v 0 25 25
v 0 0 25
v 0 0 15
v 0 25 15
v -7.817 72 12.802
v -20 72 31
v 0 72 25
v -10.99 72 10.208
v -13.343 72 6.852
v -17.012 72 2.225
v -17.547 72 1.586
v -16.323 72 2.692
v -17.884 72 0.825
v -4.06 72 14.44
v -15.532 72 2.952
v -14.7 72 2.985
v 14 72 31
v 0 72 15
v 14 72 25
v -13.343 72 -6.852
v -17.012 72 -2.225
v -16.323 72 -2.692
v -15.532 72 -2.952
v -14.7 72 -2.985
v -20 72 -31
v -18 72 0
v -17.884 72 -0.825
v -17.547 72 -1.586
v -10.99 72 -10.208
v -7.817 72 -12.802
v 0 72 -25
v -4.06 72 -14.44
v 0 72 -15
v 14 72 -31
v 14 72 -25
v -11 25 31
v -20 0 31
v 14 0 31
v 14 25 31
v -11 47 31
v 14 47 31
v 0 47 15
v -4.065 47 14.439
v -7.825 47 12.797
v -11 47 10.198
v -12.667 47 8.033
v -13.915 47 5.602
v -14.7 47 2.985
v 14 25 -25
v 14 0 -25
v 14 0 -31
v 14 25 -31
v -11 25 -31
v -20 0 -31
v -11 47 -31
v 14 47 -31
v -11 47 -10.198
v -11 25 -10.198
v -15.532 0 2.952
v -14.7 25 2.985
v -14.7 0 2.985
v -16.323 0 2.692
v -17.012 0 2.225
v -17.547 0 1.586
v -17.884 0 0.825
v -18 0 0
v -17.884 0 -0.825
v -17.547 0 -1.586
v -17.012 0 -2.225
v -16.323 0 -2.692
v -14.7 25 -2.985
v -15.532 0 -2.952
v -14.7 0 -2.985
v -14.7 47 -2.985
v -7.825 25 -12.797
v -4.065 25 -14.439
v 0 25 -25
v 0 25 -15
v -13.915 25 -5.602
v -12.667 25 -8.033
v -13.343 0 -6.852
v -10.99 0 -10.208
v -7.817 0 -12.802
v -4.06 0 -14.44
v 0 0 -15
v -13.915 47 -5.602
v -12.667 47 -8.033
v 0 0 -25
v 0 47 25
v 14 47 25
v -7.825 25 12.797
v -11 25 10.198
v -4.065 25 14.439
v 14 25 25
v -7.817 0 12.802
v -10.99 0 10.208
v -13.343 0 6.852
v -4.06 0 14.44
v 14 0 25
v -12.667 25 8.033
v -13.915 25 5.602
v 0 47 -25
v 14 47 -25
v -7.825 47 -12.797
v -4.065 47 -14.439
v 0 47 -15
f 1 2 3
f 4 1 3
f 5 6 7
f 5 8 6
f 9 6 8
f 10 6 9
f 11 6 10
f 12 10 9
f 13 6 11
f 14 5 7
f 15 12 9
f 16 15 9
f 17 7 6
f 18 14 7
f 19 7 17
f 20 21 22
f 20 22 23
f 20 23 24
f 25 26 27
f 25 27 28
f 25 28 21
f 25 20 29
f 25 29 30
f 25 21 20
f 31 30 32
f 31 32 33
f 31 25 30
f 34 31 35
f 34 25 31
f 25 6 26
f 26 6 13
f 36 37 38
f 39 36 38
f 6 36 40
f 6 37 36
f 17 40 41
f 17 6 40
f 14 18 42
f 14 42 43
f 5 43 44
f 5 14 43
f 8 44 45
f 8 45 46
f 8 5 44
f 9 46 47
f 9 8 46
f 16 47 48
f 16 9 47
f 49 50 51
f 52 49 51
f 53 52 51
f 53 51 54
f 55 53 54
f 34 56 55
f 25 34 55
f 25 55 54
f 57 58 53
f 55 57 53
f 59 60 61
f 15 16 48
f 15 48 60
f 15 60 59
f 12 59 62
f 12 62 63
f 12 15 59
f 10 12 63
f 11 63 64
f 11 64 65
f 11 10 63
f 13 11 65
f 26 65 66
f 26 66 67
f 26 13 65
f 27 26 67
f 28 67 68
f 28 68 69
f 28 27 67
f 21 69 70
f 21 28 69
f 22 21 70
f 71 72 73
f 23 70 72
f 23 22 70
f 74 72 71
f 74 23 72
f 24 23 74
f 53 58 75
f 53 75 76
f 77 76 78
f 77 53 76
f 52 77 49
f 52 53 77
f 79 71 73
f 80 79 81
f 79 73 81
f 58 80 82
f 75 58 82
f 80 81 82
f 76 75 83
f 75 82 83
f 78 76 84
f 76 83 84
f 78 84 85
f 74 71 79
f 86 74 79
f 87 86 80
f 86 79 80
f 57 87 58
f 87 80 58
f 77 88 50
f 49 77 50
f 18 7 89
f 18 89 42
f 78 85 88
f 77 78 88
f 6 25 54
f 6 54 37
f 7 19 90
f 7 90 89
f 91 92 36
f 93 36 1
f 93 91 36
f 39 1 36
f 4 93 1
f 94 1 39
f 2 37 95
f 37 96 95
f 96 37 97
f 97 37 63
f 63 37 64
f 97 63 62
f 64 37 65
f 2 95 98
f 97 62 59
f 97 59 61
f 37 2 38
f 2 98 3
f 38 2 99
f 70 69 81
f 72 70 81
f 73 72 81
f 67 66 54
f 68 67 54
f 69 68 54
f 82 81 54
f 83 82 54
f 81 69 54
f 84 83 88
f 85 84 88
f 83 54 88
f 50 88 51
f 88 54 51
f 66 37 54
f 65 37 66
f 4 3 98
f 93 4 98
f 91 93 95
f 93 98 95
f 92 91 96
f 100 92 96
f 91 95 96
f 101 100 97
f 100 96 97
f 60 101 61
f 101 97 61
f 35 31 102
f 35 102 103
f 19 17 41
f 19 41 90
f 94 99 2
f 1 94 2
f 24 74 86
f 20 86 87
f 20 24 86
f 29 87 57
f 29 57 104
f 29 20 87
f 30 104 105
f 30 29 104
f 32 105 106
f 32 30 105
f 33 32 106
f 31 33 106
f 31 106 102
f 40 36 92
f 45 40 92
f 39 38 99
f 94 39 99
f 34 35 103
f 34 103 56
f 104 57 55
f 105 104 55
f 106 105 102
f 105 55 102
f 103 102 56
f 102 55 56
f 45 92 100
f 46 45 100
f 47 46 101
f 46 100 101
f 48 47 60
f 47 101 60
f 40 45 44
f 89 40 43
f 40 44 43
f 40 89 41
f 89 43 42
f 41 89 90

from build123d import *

# Parameters (mm, degrees)
BOSS_EXTRUDE1_DEPTH = 25
BOSS_EXTRUDE2_DEPTH = 22


with BuildPart() as part:
    # Sketch1 → Boss-Extrude1 (new body)
    with BuildSketch(Plane(origin=(0, 0, 0), x_dir=(1, 0, 0), z_dir=(0, 1, 0))):
        with BuildLine():
            Line((0, 25), (14, 25))
            Line((14, 25), (14, 31))
            Line((14, 31), (-20, 31))
            Line((-20, 31), (-20, -31))
            Line((-20, -31), (14, -31))
            Line((14, -31), (14, -25))
            Line((14, -25), (0, -25))
            Line((0, -25), (0, -15))
            ThreePointArc((0, -15), (-9.492775288, -11.614095631), (-14.7, -2.984962311))
            ThreePointArc((-14.7, -2.984962311), (-18, 0), (-14.7, 2.984962311))
            ThreePointArc((-14.7, 2.984962311), (-9.492775288, 11.614095631), (0, 15))
            Line((0, 15), (0, 25))
        make_face()
    boss_extrude1 = extrude(amount=BOSS_EXTRUDE1_DEPTH)

    # Sketch2 → Boss-Extrude2 (add)
    with BuildSketch(Plane(origin=(0, 25, 0), x_dir=(1, 0, 0), z_dir=(0, 1, 0))):
        with BuildLine():
            Line((-20, 31), (-20, -31))
            Line((-20, -31), (-11, -31))
            Line((-11, -31), (-11, -10.198039027))
            ThreePointArc((-11, -10.198039027), (-13.346520855, -6.846194642), (-14.7, -2.984962311))
            ThreePointArc((-14.7, -2.984962311), (-18, 0), (-14.7, 2.984962311))
            ThreePointArc((-14.7, 2.984962311), (-13.346520855, 6.846194642), (-11, 10.198039027))
            Line((-11, 10.198039027), (-11, 31))
            Line((-11, 31), (-20, 31))
        make_face()
    extrude(amount=BOSS_EXTRUDE2_DEPTH)

    # Mirror1: Boss-Extrude1 across plane
    add(boss_extrude1.mirror(Plane.ZX.offset(36)))


solid = part.part
